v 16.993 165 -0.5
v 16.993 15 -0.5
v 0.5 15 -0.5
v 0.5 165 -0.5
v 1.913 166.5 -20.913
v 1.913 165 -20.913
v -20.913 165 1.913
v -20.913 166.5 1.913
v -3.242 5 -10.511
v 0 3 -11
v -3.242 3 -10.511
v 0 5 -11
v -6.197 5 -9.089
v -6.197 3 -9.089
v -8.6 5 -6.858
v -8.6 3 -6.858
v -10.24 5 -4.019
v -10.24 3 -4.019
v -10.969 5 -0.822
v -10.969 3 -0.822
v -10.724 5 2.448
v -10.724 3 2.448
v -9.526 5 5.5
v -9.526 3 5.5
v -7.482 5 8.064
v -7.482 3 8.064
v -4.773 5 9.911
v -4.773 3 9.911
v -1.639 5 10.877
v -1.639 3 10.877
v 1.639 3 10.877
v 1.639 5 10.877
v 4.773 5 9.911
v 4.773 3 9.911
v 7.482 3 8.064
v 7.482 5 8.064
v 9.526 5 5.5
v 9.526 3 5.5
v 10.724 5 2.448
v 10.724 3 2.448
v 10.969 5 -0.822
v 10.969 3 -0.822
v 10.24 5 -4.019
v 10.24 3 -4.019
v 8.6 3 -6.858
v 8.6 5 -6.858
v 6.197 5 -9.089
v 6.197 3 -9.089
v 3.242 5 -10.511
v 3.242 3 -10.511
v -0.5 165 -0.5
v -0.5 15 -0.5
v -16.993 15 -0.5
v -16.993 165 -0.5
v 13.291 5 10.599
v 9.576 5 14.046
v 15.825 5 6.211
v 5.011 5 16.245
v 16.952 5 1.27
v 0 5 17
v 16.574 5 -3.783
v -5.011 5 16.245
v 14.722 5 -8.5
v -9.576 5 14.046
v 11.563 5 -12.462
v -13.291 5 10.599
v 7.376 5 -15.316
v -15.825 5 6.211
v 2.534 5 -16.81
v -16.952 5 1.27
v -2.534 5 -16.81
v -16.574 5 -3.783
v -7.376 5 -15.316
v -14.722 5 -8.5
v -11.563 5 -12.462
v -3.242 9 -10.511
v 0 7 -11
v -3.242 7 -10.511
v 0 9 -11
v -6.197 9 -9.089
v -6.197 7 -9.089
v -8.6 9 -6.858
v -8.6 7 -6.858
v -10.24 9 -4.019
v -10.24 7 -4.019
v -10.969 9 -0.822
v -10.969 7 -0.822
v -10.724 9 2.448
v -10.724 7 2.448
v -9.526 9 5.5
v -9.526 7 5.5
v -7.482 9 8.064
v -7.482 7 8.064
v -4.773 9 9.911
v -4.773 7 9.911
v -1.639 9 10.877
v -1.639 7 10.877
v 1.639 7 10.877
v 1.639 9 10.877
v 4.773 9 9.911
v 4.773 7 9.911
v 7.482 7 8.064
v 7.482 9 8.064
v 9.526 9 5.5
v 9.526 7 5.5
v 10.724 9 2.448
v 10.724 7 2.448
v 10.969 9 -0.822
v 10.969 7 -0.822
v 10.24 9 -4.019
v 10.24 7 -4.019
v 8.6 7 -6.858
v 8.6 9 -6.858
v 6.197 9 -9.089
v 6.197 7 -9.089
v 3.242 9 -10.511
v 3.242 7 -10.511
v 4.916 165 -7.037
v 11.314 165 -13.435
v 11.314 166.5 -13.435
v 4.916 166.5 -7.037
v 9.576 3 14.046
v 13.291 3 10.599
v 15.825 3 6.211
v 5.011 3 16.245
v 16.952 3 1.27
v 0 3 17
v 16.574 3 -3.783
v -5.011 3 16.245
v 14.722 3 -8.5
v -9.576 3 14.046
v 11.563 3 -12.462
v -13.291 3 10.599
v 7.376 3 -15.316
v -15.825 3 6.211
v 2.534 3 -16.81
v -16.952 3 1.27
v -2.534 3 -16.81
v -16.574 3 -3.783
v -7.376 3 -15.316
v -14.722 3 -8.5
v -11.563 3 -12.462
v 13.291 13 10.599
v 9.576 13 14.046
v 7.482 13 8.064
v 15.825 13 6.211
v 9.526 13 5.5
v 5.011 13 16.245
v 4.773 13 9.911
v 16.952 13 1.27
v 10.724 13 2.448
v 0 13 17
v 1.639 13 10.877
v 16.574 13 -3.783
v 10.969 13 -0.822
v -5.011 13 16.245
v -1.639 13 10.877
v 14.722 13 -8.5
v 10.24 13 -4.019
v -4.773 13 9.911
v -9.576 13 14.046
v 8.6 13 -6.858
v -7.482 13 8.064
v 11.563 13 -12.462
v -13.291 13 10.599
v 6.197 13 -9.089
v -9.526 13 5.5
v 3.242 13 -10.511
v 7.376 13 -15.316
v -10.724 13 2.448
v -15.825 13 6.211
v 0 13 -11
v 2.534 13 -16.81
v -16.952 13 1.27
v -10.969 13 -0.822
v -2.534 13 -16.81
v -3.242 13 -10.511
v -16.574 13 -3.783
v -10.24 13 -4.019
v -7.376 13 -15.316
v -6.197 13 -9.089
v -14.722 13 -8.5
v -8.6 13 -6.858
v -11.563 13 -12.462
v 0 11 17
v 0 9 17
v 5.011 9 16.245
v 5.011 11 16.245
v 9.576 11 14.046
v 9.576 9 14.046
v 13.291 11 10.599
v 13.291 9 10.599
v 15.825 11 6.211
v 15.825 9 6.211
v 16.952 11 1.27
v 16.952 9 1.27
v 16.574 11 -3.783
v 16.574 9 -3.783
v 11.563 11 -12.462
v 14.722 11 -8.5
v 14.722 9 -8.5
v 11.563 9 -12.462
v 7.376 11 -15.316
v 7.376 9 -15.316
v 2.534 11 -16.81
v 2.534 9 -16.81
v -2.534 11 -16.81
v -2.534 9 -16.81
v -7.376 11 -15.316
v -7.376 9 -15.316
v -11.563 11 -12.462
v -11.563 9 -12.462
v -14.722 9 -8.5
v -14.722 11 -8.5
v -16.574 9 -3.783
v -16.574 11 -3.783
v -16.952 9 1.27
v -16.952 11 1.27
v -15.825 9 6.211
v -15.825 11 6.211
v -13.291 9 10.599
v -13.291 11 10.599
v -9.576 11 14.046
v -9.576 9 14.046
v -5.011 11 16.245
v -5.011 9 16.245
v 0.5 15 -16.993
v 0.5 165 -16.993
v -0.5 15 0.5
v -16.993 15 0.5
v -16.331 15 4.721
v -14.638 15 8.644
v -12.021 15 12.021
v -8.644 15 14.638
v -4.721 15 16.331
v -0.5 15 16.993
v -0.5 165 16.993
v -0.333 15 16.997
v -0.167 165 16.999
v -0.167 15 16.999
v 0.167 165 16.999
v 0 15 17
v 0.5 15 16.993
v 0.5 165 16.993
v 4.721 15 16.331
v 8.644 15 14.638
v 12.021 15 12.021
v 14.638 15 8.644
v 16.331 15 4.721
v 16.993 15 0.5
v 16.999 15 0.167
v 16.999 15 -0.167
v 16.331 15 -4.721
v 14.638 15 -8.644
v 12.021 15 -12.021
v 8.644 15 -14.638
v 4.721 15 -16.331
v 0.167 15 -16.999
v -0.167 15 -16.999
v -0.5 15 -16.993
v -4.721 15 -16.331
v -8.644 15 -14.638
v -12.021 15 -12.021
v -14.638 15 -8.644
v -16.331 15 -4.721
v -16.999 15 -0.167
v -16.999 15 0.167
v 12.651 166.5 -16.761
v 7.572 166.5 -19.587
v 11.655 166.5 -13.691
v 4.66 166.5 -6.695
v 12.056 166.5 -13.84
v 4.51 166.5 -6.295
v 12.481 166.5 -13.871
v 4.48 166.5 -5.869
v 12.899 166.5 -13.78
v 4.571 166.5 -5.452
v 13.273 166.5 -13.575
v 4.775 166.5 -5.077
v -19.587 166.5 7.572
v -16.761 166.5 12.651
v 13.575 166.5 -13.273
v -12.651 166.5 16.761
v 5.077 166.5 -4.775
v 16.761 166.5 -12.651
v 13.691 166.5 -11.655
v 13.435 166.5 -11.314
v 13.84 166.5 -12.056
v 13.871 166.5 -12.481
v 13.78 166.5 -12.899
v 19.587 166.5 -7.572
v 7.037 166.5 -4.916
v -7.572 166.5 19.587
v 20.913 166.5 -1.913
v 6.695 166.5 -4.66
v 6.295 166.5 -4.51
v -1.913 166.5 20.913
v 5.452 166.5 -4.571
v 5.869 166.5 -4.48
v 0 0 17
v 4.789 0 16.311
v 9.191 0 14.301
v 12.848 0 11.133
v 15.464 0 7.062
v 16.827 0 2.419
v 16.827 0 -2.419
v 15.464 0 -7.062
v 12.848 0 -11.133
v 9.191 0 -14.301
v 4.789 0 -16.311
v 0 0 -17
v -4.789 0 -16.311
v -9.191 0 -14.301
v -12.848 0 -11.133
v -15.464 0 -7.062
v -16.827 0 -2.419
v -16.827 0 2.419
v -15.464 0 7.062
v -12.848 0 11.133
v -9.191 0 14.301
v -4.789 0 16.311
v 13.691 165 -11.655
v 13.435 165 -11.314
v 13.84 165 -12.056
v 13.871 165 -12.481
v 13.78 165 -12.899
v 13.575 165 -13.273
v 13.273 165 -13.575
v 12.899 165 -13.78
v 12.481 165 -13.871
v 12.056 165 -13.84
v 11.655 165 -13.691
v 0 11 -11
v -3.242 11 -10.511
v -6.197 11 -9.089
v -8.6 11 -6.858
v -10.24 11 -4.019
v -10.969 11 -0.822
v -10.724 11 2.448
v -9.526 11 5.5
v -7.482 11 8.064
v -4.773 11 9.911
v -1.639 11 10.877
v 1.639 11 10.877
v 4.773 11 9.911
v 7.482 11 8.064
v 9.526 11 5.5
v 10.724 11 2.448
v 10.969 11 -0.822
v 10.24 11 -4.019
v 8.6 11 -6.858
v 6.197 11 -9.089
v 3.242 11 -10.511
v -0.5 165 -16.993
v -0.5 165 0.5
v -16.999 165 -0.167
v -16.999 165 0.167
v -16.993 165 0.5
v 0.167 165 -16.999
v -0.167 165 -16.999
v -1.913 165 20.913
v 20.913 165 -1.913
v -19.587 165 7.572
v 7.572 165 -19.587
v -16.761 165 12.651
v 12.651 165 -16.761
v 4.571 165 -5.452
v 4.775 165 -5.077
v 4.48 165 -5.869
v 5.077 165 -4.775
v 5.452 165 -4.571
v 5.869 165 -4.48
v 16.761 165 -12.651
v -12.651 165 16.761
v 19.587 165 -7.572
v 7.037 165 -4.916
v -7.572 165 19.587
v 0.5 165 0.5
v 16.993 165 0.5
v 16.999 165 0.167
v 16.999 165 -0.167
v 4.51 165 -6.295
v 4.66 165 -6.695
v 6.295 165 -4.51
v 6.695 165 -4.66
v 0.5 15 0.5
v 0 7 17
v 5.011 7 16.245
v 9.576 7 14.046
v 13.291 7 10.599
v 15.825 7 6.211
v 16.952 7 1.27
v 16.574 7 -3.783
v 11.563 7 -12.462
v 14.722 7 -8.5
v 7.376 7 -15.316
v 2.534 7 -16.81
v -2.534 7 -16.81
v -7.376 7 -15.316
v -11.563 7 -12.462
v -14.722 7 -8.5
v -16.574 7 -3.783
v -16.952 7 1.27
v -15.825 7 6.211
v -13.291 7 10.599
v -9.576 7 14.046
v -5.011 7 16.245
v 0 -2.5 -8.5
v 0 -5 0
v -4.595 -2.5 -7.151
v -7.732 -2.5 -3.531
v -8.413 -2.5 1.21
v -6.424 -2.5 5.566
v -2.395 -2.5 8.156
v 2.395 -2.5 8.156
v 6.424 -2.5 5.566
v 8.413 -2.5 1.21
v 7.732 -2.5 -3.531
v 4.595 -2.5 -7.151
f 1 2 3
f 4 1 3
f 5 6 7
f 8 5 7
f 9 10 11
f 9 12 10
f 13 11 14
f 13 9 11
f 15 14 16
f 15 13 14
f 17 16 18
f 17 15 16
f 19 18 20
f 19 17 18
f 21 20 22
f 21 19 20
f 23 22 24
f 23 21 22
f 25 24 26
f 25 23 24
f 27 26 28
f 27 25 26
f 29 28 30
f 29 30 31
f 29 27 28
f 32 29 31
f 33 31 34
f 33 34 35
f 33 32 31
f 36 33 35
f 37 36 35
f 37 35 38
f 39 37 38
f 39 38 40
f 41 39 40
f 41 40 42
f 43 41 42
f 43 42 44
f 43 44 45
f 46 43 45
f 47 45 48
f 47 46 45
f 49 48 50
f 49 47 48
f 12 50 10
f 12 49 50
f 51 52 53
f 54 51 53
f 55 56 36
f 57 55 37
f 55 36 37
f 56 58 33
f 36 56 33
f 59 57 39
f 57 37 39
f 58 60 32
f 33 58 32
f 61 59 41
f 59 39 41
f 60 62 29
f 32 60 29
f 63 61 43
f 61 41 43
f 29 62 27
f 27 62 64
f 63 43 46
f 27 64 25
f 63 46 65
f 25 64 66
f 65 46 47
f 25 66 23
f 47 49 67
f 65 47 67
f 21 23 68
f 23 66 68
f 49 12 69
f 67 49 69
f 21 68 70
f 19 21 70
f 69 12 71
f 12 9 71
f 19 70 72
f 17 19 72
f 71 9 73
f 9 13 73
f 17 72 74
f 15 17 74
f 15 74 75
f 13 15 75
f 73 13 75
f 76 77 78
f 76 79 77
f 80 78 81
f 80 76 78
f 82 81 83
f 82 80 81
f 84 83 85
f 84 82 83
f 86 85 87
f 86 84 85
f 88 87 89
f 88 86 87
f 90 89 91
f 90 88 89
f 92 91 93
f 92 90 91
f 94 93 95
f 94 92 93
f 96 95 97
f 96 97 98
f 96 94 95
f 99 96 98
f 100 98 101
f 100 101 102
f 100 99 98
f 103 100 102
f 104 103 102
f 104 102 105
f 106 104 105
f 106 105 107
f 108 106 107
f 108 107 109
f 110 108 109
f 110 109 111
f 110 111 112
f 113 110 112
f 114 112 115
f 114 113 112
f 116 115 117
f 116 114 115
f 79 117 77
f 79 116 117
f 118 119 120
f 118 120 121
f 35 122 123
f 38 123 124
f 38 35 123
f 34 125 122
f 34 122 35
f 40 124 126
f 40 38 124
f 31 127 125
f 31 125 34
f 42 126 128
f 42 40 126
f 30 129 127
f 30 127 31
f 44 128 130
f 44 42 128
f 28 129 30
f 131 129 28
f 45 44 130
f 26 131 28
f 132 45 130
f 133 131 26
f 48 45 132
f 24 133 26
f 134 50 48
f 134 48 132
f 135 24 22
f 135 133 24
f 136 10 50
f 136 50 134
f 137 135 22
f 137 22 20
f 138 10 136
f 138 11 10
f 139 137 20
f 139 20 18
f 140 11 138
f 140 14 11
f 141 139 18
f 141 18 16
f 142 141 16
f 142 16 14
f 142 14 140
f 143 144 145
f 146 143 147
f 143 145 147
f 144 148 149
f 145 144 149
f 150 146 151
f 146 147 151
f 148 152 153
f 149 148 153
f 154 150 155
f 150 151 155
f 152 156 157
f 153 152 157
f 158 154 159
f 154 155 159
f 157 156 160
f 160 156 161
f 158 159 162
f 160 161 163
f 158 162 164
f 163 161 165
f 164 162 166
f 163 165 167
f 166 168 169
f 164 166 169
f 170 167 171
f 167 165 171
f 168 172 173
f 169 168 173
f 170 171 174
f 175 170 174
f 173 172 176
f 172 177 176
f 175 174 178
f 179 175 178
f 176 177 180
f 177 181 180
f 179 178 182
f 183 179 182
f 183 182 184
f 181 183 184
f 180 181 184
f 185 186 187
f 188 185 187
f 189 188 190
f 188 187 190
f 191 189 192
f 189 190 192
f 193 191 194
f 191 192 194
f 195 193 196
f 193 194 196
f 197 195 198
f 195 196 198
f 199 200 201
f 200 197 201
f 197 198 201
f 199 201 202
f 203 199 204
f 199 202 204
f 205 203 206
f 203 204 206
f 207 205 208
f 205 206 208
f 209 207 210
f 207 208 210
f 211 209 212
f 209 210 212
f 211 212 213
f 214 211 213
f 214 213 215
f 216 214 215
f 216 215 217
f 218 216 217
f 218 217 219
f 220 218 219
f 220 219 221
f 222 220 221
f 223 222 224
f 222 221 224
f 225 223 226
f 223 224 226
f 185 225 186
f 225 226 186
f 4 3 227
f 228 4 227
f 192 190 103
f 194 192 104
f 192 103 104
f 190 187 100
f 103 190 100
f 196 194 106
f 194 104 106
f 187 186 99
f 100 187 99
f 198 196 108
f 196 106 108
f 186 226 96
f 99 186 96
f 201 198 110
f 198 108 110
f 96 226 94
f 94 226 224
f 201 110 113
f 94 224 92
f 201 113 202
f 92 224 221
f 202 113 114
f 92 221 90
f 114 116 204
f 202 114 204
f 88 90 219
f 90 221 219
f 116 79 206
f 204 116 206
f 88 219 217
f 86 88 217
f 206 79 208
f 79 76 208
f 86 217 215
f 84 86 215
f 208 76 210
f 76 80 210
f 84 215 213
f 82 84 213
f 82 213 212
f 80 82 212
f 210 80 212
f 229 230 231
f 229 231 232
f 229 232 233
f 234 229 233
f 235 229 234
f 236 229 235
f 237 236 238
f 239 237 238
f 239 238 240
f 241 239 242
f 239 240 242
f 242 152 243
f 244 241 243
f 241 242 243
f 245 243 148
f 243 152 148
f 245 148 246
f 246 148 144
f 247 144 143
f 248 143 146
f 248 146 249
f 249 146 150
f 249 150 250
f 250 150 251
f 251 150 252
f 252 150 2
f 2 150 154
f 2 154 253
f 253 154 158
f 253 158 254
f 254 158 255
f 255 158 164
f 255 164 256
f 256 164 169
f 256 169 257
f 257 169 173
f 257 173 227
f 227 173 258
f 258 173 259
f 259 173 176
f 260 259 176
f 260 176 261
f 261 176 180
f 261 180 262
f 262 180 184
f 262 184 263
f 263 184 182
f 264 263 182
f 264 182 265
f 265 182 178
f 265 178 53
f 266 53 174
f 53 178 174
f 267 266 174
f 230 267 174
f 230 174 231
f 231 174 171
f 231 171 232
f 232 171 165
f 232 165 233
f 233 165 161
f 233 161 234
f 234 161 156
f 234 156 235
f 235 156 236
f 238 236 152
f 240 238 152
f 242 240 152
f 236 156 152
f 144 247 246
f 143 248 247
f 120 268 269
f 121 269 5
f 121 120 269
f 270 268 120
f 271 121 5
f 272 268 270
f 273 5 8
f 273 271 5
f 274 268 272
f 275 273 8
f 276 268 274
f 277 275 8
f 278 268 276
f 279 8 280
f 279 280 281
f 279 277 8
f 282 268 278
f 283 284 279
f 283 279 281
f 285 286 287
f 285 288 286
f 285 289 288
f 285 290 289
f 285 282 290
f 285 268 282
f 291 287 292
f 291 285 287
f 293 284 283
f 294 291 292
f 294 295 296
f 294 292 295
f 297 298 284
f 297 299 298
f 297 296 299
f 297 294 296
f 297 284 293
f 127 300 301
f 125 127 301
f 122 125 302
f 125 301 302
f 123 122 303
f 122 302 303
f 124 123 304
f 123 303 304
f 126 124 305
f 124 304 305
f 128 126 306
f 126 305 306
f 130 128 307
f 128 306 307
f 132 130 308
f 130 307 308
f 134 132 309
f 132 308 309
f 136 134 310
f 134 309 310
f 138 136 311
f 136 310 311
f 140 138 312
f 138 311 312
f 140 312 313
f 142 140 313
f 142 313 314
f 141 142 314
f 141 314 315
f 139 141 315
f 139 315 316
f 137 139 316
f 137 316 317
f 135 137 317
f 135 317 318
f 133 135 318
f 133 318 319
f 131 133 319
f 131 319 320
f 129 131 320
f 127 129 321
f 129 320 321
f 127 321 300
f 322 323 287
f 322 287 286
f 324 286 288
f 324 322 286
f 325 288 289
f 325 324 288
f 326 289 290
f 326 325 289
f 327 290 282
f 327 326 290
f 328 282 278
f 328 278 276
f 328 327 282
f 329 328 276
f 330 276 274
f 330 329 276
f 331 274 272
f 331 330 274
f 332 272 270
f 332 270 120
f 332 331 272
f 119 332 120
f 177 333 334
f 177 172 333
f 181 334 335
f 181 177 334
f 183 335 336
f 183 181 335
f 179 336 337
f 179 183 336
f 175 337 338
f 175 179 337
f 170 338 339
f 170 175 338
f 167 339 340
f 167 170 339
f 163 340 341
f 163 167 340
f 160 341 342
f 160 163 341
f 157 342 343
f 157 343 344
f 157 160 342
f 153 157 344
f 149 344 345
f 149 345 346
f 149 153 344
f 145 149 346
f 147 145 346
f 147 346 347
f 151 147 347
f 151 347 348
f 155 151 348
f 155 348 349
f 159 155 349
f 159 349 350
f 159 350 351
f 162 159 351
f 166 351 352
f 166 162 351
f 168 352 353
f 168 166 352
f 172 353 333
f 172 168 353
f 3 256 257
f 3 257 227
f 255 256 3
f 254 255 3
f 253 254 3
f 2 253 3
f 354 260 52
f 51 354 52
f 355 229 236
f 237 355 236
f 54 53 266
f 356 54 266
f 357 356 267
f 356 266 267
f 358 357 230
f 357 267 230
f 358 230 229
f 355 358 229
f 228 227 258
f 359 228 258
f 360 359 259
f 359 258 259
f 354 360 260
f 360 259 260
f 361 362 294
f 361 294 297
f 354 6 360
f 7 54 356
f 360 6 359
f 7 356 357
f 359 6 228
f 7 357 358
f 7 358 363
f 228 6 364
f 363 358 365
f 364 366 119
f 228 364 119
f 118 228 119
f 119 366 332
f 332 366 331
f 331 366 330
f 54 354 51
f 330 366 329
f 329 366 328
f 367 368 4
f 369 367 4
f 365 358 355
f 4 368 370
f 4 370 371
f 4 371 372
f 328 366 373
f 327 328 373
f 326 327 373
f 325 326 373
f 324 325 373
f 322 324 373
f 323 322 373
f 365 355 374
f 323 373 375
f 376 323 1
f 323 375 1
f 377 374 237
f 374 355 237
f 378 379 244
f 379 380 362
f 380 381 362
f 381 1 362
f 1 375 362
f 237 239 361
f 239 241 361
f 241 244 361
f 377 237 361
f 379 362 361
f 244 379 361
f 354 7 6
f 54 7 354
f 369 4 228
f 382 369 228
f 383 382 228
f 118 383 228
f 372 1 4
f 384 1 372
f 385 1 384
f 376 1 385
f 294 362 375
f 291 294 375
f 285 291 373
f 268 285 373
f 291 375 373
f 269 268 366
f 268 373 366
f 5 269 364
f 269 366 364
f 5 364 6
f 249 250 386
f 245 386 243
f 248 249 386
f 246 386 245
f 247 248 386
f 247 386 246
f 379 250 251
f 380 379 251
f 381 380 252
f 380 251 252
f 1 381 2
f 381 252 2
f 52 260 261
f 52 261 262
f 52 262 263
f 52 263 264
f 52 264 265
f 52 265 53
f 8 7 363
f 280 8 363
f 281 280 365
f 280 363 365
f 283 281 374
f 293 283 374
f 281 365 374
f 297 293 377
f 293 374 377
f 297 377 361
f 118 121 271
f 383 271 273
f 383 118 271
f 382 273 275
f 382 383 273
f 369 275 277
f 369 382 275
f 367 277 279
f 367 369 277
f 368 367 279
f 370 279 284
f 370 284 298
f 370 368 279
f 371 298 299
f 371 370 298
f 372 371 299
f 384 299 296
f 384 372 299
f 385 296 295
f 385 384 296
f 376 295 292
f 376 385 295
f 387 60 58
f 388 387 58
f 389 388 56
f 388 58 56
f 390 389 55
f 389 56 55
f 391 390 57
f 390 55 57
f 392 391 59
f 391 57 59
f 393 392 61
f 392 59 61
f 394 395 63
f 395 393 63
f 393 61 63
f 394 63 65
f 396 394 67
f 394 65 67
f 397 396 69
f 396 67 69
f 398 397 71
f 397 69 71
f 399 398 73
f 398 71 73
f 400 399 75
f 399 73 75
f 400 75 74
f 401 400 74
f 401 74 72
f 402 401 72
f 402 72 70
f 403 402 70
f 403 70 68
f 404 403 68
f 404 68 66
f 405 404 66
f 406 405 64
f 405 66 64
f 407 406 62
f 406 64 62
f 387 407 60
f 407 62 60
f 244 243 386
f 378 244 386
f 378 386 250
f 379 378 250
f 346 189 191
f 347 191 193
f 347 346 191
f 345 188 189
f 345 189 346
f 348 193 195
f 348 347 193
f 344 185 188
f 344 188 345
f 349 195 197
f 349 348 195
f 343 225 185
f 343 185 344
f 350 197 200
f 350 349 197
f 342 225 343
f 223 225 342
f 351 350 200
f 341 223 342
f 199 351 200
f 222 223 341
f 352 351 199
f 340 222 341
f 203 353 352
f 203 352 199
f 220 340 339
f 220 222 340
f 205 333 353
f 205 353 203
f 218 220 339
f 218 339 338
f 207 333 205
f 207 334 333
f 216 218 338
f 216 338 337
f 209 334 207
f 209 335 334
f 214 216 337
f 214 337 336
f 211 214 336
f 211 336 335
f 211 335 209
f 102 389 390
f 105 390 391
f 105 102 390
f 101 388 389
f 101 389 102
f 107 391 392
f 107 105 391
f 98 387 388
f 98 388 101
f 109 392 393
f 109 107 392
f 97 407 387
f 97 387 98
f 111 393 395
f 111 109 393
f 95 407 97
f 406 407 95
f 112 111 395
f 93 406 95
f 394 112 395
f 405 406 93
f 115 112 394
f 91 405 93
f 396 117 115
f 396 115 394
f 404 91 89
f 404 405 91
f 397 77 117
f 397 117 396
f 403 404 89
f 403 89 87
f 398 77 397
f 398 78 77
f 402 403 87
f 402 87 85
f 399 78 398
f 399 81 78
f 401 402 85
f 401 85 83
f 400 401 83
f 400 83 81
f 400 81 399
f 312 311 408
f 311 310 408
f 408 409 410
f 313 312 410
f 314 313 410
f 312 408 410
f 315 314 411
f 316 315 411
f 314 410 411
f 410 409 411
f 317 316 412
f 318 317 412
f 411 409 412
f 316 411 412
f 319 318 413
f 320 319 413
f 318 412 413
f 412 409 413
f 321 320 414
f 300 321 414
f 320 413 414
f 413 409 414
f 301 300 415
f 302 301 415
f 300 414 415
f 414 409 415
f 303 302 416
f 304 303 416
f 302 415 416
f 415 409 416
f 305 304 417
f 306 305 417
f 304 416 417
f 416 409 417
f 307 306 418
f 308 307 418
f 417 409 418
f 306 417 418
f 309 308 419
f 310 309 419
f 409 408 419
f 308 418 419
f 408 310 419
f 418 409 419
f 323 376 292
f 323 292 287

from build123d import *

# Parameters (mm, degrees)
SKETCH_1_R          = 17
EXTRUDE_1_DEPTH     = 15
SKETCH_2_W          = 6
SKETCH_2_H          = 2
EXTRUDE_2_DEPTH     = 150
SKETCH_5_R          = 21
EXTRUDE_3_DEPTH     = 1.5
CUT_EXTRUDE_START   = -5
CUT_EXTRUDE_1_DEPTH = 5


with BuildPart() as part:
    # 草图1 → 凸台-拉伸1 (new body)
    with BuildSketch(Plane(origin=(0, 0, 0), x_dir=(1, 0, 0), z_dir=(0, 1, 0))):
        with Locations(Location((0, 0, 0), (0, 0, 270))):
            Circle(SKETCH_1_R)
    extrude(amount=EXTRUDE_1_DEPTH)

    # 草图2 → 切除-旋转1 (revolve, cut)
    with BuildSketch(Plane.XY, mode=Mode.PRIVATE) as cut_revolve_1_sk:
        with Locations((-14, 12)):
            Rectangle(SKETCH_2_W, SKETCH_2_H)
        with Locations((-14, 8)):
            Rectangle(SKETCH_2_W, SKETCH_2_H)
        with Locations((-14, 4)):
            Rectangle(SKETCH_2_W, SKETCH_2_H)
    revolve(cut_revolve_1_sk.sketch.rotate(Axis((0, 0, 0), (0, 1, 0)), 270), axis=Axis((0, 0, 0), (0, 1, 0)), mode=Mode.SUBTRACT)

    # 草图3 → 旋转2 (revolve)
    with BuildSketch(Plane.XY, mode=Mode.PRIVATE) as revolve_2_sk:
        Polygon((0, 0), (-17, 0), (0, -5), align=None)
    revolve(revolve_2_sk.sketch.rotate(Axis((0, 0, 0), (0, 1, 0)), 270), axis=Axis((0, 0, 0), (0, 1, 0)))

    # 草图4 → 凸台-拉伸2 (add)
    with BuildSketch(Plane(origin=(0, 15, 0), x_dir=(1, 0, 0), z_dir=(0, 1, 0))):
        with BuildLine():
            Line((-0.5, 16.992645468), (-0.5, 0.5))
            Line((-0.5, 0.5), (-16.992645468, 0.5))
            ThreePointArc((-16.992645468, 0.5), (-17, 0), (-16.992645468, -0.5))
            Line((-16.992645468, -0.5), (-0.5, -0.5))
            Line((-0.5, -0.5), (-0.5, -16.992645468))
            ThreePointArc((-0.5, -16.992645468), (0, -17), (0.5, -16.992645468))
            Line((0.5, -16.992645468), (0.5, -0.5))
            Line((0.5, -0.5), (16.992645468, -0.5))
            ThreePointArc((16.992645468, -0.5), (17, 0), (16.992645468, 0.5))
            Line((16.992645468, 0.5), (0.5, 0.5))
            Line((0.5, 0.5), (0.5, 16.992645468))
            ThreePointArc((0.5, 16.992645468), (0, 17), (-0.5, 16.992645468))
        make_face()
    extrude(amount=EXTRUDE_2_DEPTH)

    # 草图5 → 凸台-拉伸3 (add)
    with BuildSketch(Plane(origin=(0, 165, 0), x_dir=(1, 0, 0), z_dir=(0, 1, 0))):
        with Locations(Location((0, 0, 0), (0, 0, 270))):
            Circle(SKETCH_5_R)
    extrude(amount=EXTRUDE_3_DEPTH)

    # 草图7 → 切除-拉伸1 (cut)
    with BuildSketch(Plane(origin=(0, 166.5, 0), x_dir=(1, 0, 0), z_dir=(0, 1, 0)).offset(CUT_EXTRUDE_START)):
        with BuildLine():
            ThreePointArc((21, 0), (20.978166703, 0.957351445), (20.912712211, 1.912712211))
            Line((20.912712211, 1.912712211), (19, 0))
            Line((19, 0), (-1.912712211, -20.912712211))
            ThreePointArc((-1.912712211, -20.912712211), (14.156854234, -15.510753631), (21, 0))
        make_face()
        with BuildLine():
            Line((11.313708499, 13.435028843), (4.915542193, 7.036862537))
            ThreePointArc((4.915542193, 7.036862537), (4.915542193, 4.915542193), (7.036862537, 4.915542193))
            Line((7.036862537, 4.915542193), (13.435028843, 11.313708499))
            ThreePointArc((13.435028843, 11.313708499), (13.435028843, 13.435028843), (11.313708499, 13.435028843))
        make_face()
        with BuildLine():
            Line((1.912712211, 20.912712211), (-20.912712211, -1.912712211))
            ThreePointArc((-20.912712211, -1.912712211), (-14.849242405, 14.849242405), (1.912712211, 20.912712211))
        make_face()
    extrude(amount=CUT_EXTRUDE_1_DEPTH, mode=Mode.SUBTRACT)


solid = part.part
